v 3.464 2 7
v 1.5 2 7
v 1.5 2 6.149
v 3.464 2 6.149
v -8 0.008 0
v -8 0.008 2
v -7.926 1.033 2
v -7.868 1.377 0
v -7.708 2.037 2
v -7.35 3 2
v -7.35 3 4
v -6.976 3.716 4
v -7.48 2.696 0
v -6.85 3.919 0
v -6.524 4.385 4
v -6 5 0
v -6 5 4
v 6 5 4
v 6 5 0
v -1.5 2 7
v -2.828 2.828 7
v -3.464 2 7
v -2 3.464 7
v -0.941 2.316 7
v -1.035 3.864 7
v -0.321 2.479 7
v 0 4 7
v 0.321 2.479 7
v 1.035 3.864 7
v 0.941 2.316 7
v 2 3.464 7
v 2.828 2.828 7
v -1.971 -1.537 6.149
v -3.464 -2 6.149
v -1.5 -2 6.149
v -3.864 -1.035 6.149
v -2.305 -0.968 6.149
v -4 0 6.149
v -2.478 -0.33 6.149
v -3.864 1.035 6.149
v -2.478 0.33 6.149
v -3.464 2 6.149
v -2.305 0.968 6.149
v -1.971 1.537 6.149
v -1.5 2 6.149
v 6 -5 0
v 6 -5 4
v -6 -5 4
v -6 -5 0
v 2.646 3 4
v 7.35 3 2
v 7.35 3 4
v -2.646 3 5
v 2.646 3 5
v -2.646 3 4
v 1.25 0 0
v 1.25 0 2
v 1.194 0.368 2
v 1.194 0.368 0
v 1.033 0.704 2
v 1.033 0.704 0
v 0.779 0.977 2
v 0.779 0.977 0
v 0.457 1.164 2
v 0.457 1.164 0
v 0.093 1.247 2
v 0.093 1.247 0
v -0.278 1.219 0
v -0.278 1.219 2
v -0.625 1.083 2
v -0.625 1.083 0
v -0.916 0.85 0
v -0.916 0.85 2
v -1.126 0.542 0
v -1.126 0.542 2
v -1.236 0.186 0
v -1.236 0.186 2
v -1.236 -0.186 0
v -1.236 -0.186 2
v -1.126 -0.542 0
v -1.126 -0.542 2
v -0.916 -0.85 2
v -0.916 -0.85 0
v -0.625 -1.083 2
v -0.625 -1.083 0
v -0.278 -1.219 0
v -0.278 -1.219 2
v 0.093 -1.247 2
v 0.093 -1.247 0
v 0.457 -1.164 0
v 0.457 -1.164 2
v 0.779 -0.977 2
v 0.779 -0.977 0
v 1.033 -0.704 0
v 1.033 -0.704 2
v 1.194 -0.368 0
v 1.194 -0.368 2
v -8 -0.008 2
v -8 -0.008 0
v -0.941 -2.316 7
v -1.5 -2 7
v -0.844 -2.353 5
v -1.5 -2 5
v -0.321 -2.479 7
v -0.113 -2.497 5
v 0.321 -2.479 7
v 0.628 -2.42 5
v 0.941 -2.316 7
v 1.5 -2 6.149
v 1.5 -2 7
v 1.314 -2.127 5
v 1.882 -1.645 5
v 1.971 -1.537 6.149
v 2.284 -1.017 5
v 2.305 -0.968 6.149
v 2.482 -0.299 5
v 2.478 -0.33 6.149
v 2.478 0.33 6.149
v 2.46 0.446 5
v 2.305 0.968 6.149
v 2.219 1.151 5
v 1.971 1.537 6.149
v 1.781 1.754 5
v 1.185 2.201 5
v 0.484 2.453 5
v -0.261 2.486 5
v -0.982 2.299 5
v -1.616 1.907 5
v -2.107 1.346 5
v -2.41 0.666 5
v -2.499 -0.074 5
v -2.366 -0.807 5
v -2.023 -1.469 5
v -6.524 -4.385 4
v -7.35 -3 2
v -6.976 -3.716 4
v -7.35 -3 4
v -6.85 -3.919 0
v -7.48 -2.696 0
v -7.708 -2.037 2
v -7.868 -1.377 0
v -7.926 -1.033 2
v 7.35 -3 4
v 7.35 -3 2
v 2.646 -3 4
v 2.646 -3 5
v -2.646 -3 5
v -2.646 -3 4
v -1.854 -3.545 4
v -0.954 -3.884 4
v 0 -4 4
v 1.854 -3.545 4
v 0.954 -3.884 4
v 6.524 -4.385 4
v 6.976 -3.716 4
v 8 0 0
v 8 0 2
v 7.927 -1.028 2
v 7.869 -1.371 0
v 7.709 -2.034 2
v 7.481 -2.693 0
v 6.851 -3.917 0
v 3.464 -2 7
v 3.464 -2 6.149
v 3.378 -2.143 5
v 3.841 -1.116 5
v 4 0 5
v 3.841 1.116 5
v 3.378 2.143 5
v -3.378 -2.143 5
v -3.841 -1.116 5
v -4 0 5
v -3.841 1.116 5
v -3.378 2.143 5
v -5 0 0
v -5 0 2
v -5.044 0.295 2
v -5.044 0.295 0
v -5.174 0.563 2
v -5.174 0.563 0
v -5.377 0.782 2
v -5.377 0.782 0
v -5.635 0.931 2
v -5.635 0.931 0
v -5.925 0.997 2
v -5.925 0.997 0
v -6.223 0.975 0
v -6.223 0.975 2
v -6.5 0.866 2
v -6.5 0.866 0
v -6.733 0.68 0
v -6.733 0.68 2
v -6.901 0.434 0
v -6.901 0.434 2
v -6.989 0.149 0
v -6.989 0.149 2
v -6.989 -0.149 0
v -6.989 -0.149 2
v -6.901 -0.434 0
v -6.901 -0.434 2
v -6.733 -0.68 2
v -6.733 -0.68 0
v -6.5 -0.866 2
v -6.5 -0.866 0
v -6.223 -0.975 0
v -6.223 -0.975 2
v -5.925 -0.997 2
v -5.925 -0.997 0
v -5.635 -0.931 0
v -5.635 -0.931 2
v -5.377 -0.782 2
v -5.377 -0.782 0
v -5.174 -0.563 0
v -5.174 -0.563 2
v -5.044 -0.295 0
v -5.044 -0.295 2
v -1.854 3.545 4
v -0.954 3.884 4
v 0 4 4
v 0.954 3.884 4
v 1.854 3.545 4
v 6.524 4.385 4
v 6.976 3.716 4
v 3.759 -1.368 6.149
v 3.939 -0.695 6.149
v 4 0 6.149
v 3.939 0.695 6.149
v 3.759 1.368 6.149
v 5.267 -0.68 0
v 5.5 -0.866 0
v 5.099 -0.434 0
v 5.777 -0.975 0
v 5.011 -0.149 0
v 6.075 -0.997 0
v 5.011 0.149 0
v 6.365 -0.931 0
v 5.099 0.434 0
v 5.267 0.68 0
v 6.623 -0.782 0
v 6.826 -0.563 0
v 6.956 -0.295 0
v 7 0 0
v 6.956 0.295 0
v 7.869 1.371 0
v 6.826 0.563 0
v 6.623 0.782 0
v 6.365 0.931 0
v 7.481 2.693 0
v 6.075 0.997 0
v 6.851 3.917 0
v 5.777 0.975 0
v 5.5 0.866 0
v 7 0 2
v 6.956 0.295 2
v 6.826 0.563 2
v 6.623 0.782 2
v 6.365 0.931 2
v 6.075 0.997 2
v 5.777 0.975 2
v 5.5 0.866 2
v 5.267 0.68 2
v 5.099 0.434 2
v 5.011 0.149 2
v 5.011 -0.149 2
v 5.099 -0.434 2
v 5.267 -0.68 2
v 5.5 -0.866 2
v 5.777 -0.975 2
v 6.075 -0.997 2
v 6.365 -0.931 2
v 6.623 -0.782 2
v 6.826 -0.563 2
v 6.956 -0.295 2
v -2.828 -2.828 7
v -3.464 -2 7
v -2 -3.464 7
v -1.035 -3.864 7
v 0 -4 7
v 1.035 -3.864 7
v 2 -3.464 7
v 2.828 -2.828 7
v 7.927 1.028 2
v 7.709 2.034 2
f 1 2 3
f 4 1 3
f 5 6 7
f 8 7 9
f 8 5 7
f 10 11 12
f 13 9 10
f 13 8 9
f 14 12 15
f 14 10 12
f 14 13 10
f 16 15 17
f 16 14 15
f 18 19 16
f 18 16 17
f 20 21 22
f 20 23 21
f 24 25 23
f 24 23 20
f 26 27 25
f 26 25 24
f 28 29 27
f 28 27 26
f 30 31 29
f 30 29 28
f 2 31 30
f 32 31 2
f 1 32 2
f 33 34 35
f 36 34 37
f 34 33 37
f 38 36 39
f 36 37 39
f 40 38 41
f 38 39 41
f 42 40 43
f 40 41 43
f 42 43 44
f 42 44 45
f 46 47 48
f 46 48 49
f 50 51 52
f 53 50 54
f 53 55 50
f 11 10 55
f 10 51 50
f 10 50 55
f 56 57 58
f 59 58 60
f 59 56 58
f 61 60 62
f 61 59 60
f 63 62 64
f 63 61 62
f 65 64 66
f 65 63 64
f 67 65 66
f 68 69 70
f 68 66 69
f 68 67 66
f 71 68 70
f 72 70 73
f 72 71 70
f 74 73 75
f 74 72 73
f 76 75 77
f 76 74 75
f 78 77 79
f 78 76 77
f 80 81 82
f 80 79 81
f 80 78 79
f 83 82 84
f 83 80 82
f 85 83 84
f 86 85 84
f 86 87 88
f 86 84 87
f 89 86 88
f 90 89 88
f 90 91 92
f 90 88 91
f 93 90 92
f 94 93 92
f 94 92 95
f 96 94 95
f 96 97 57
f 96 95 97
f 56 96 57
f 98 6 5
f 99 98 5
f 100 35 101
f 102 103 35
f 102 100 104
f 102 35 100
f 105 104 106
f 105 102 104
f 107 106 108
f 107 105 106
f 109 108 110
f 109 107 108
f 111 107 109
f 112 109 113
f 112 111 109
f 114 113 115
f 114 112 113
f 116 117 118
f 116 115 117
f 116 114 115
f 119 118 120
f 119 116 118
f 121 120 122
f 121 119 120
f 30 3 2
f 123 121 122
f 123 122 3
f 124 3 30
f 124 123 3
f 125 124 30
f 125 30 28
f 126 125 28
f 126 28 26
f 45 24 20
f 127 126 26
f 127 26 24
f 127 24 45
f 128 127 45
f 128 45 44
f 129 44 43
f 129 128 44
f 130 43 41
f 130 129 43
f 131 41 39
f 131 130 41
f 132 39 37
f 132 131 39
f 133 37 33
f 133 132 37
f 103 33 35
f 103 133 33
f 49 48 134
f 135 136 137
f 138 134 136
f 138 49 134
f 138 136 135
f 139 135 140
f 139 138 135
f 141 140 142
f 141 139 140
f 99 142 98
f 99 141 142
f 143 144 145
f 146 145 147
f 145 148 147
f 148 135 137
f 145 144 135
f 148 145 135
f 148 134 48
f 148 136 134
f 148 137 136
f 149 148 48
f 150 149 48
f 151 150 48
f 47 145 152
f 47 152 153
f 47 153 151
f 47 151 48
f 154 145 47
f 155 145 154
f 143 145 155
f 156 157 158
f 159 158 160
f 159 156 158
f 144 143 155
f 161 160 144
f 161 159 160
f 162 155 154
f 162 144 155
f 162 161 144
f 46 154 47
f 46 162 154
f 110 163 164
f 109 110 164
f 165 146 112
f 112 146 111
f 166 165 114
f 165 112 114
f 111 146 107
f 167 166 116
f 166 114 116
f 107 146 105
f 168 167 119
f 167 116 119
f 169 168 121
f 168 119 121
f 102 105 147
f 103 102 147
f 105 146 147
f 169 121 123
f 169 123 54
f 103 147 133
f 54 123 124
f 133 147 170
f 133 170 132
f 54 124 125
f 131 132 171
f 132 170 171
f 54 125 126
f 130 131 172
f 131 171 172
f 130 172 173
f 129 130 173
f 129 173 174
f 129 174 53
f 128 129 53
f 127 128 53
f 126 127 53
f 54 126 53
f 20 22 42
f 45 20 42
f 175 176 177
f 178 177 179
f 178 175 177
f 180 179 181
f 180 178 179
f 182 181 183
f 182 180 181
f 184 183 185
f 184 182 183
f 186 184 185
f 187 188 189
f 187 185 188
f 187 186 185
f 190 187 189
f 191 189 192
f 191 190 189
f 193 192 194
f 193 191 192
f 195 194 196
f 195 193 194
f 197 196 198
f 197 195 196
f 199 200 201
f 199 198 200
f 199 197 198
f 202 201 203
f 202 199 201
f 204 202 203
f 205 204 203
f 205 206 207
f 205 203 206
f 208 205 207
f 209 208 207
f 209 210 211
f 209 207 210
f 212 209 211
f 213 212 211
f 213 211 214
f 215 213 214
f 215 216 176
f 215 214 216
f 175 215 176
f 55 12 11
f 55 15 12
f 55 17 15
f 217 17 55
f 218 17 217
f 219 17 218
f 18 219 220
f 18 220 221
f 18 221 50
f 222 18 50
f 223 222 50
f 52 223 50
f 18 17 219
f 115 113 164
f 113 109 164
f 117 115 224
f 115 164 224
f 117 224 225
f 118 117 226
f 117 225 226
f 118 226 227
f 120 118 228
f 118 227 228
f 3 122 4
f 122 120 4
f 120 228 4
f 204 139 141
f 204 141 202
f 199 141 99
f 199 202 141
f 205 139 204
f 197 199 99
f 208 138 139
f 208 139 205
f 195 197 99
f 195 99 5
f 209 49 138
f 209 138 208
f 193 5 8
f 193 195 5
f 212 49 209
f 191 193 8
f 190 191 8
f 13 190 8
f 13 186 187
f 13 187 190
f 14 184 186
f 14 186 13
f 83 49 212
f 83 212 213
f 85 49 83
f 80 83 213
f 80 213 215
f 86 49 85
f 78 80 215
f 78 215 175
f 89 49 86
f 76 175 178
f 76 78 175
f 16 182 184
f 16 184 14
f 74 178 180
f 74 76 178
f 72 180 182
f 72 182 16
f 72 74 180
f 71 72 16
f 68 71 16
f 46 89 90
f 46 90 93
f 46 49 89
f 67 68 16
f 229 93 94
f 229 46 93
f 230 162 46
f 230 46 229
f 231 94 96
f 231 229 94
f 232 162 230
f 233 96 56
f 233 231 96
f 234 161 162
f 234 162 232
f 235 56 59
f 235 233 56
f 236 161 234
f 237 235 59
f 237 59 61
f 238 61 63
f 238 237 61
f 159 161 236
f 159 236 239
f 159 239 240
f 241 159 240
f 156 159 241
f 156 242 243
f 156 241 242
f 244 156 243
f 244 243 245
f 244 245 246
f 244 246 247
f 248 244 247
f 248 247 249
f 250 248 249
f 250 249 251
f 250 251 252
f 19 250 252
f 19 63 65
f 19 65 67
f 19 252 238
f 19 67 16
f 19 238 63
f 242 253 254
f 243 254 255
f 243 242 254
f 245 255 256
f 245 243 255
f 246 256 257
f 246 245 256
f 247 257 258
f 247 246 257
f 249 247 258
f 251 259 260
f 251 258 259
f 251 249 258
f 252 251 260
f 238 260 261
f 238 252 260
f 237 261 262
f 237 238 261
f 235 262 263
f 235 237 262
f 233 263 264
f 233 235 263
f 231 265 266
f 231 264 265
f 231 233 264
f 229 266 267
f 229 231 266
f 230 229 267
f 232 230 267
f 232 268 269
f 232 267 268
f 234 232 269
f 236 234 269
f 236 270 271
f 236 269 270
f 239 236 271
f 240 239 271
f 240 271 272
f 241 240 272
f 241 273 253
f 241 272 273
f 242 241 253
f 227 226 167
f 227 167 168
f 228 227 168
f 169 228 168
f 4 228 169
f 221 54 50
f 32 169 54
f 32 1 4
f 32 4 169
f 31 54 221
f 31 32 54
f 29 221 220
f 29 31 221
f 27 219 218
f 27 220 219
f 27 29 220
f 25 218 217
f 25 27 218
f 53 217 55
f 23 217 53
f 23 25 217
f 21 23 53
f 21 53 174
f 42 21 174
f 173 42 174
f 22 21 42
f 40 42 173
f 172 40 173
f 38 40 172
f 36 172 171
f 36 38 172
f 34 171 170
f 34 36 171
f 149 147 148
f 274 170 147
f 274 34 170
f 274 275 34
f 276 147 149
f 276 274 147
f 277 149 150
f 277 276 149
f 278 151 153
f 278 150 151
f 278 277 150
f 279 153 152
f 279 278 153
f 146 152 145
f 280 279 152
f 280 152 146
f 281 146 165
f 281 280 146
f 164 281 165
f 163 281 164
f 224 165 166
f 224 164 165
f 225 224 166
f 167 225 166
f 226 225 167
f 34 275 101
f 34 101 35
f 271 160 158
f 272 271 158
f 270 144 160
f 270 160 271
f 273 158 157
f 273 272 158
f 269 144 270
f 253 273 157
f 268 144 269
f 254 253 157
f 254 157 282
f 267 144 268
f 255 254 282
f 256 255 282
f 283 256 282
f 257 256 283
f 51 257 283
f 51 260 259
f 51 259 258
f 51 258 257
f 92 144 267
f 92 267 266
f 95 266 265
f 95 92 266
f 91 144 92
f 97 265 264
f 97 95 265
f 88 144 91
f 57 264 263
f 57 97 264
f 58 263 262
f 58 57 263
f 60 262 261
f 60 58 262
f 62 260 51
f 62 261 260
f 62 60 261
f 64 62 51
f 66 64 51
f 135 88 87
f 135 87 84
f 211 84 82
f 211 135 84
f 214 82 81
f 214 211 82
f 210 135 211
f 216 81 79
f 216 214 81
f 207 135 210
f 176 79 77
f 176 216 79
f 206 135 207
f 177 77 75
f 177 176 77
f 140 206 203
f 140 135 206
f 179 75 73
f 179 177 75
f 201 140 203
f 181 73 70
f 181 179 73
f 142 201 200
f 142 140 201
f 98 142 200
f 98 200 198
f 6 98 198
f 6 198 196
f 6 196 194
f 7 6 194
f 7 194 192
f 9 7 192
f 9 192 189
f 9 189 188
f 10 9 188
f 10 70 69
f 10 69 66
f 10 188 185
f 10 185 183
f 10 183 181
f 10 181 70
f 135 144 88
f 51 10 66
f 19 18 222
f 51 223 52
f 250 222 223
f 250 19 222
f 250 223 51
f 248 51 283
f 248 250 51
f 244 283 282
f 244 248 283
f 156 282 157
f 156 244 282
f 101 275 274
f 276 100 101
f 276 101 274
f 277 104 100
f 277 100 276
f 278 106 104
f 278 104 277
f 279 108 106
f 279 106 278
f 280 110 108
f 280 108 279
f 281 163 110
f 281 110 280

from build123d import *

# Parameters (mm, degrees)
BOSS_EXTRUDE1_DEPTH      = 8
SKETCH2_W                = 3
SKETCH2_H                = 6
CUT_EXTRUDE1_DEPTH       = 16
CUT_EXTRUDE2_START       = -7
CUT_EXTRUDE2_OUTLINE_R   = 1
CUT_EXTRUDE2_OUTLINE_R_2 = 1.25
CUT_EXTRUDE2_DEPTH       = 7
SKETCH4_R                = 11.300905521
SKETCH4_R_2              = 4
CUT_EXTRUDE3_DEPTH       = 3
SKETCH5_W                = 0.851480407
SKETCH5_H                = 4
CUT_EXTRUDE4_DEPTH       = 8
CUT_EXTRUDE5_DEPTH       = 1
CUT_EXTRUDE5_DEPTH_BACK  = 2
SKETCH6_R                = 2.5


# Read off the part's stored shape, not the designer's step: Cut-Extrude2
with BuildPart() as part:
    # Sketch1 → Boss-Extrude1 (new, symmetric)
    with BuildSketch(Plane(origin=(0, 0, 0), x_dir=(0, 0, -1), z_dir=(1, 0, 0))):
        Polygon((0, -5), (0, 5), (-4, 5), (-4, 4), (-7, 4), (-7, -4), (-4, -4), (-4, -5), align=None)
    extrude(amount=BOSS_EXTRUDE1_DEPTH, both=True)

    # Sketch2 → Cut-Extrude1 (cut)
    with BuildSketch(Plane.ZY.offset(8)):
        with Locations((3.5, 0)):
            Rectangle(SKETCH2_W, SKETCH2_H)
    extrude(amount=-CUT_EXTRUDE1_DEPTH, mode=Mode.SUBTRACT)

    # Cut-Extrude2 outline → Cut-Extrude2 (cut)
    with BuildSketch(Plane.XY.offset(7).offset(CUT_EXTRUDE2_START)):
        with BuildLine():
            ThreePointArc((-8.000004764, 0), (-7.481459456, 2.692583288), (-6, 5))
            Line((-6, 5), (-8, 5))
            Line((-8, 5), (-8.000004764, 0))
        make_face()
        with BuildLine():
            ThreePointArc((-6, -5), (-7.481459456, -2.692583288), (-8.000004764, 0))
            Line((-8.000004764, 0), (-8, -5))
            Line((-8, -5), (-6, -5))
        make_face()
        with BuildLine():
            Line((8, 5), (6, 5))
            ThreePointArc((6, 5), (7.481456009, 2.692582404), (8, 0))
            Line((8, 0), (8, 5))
        make_face()
        with BuildLine():
            Line((8, -5), (8, 0))
            ThreePointArc((8, 0), (7.481456009, -2.692582404), (6, -5))
            Line((6, -5), (8, -5))
        make_face()
        with Locations((-6, 0)):
            Circle(CUT_EXTRUDE2_OUTLINE_R)
        Circle(CUT_EXTRUDE2_OUTLINE_R_2)
        with Locations((6, 0)):
            Circle(CUT_EXTRUDE2_OUTLINE_R)
    extrude(amount=CUT_EXTRUDE2_DEPTH, mode=Mode.SUBTRACT)

    # Sketch4 → Cut-Extrude3 (cut)
    with BuildSketch(Plane.XY.offset(7)):
        Circle(SKETCH4_R)
        Circle(SKETCH4_R_2, mode=Mode.SUBTRACT)
    extrude(amount=-CUT_EXTRUDE3_DEPTH, mode=Mode.SUBTRACT)

    # Sketch5 → Cut-Extrude4 (cut, symmetric)
    with BuildSketch(Plane(origin=(0, 0, 0), x_dir=(0, 0, -1), z_dir=(1, 0, 0))):
        with Locations((-6.574259796, 0)):
            Rectangle(SKETCH5_W, SKETCH5_H)
    extrude(amount=CUT_EXTRUDE4_DEPTH, both=True, mode=Mode.SUBTRACT)

    # Sketch6 → Cut-Extrude5 (cut, two sides: drawn at the far end of the back side and taken through both)
    with BuildSketch(Plane.XY.offset(6.148519593).offset(-CUT_EXTRUDE5_DEPTH_BACK)):
        with Locations(Location((0, 0, 0), (0, 0, 233.130102354))):
            Circle(SKETCH6_R)
    extrude(amount=CUT_EXTRUDE5_DEPTH + CUT_EXTRUDE5_DEPTH_BACK, mode=Mode.SUBTRACT)


solid = part.part
